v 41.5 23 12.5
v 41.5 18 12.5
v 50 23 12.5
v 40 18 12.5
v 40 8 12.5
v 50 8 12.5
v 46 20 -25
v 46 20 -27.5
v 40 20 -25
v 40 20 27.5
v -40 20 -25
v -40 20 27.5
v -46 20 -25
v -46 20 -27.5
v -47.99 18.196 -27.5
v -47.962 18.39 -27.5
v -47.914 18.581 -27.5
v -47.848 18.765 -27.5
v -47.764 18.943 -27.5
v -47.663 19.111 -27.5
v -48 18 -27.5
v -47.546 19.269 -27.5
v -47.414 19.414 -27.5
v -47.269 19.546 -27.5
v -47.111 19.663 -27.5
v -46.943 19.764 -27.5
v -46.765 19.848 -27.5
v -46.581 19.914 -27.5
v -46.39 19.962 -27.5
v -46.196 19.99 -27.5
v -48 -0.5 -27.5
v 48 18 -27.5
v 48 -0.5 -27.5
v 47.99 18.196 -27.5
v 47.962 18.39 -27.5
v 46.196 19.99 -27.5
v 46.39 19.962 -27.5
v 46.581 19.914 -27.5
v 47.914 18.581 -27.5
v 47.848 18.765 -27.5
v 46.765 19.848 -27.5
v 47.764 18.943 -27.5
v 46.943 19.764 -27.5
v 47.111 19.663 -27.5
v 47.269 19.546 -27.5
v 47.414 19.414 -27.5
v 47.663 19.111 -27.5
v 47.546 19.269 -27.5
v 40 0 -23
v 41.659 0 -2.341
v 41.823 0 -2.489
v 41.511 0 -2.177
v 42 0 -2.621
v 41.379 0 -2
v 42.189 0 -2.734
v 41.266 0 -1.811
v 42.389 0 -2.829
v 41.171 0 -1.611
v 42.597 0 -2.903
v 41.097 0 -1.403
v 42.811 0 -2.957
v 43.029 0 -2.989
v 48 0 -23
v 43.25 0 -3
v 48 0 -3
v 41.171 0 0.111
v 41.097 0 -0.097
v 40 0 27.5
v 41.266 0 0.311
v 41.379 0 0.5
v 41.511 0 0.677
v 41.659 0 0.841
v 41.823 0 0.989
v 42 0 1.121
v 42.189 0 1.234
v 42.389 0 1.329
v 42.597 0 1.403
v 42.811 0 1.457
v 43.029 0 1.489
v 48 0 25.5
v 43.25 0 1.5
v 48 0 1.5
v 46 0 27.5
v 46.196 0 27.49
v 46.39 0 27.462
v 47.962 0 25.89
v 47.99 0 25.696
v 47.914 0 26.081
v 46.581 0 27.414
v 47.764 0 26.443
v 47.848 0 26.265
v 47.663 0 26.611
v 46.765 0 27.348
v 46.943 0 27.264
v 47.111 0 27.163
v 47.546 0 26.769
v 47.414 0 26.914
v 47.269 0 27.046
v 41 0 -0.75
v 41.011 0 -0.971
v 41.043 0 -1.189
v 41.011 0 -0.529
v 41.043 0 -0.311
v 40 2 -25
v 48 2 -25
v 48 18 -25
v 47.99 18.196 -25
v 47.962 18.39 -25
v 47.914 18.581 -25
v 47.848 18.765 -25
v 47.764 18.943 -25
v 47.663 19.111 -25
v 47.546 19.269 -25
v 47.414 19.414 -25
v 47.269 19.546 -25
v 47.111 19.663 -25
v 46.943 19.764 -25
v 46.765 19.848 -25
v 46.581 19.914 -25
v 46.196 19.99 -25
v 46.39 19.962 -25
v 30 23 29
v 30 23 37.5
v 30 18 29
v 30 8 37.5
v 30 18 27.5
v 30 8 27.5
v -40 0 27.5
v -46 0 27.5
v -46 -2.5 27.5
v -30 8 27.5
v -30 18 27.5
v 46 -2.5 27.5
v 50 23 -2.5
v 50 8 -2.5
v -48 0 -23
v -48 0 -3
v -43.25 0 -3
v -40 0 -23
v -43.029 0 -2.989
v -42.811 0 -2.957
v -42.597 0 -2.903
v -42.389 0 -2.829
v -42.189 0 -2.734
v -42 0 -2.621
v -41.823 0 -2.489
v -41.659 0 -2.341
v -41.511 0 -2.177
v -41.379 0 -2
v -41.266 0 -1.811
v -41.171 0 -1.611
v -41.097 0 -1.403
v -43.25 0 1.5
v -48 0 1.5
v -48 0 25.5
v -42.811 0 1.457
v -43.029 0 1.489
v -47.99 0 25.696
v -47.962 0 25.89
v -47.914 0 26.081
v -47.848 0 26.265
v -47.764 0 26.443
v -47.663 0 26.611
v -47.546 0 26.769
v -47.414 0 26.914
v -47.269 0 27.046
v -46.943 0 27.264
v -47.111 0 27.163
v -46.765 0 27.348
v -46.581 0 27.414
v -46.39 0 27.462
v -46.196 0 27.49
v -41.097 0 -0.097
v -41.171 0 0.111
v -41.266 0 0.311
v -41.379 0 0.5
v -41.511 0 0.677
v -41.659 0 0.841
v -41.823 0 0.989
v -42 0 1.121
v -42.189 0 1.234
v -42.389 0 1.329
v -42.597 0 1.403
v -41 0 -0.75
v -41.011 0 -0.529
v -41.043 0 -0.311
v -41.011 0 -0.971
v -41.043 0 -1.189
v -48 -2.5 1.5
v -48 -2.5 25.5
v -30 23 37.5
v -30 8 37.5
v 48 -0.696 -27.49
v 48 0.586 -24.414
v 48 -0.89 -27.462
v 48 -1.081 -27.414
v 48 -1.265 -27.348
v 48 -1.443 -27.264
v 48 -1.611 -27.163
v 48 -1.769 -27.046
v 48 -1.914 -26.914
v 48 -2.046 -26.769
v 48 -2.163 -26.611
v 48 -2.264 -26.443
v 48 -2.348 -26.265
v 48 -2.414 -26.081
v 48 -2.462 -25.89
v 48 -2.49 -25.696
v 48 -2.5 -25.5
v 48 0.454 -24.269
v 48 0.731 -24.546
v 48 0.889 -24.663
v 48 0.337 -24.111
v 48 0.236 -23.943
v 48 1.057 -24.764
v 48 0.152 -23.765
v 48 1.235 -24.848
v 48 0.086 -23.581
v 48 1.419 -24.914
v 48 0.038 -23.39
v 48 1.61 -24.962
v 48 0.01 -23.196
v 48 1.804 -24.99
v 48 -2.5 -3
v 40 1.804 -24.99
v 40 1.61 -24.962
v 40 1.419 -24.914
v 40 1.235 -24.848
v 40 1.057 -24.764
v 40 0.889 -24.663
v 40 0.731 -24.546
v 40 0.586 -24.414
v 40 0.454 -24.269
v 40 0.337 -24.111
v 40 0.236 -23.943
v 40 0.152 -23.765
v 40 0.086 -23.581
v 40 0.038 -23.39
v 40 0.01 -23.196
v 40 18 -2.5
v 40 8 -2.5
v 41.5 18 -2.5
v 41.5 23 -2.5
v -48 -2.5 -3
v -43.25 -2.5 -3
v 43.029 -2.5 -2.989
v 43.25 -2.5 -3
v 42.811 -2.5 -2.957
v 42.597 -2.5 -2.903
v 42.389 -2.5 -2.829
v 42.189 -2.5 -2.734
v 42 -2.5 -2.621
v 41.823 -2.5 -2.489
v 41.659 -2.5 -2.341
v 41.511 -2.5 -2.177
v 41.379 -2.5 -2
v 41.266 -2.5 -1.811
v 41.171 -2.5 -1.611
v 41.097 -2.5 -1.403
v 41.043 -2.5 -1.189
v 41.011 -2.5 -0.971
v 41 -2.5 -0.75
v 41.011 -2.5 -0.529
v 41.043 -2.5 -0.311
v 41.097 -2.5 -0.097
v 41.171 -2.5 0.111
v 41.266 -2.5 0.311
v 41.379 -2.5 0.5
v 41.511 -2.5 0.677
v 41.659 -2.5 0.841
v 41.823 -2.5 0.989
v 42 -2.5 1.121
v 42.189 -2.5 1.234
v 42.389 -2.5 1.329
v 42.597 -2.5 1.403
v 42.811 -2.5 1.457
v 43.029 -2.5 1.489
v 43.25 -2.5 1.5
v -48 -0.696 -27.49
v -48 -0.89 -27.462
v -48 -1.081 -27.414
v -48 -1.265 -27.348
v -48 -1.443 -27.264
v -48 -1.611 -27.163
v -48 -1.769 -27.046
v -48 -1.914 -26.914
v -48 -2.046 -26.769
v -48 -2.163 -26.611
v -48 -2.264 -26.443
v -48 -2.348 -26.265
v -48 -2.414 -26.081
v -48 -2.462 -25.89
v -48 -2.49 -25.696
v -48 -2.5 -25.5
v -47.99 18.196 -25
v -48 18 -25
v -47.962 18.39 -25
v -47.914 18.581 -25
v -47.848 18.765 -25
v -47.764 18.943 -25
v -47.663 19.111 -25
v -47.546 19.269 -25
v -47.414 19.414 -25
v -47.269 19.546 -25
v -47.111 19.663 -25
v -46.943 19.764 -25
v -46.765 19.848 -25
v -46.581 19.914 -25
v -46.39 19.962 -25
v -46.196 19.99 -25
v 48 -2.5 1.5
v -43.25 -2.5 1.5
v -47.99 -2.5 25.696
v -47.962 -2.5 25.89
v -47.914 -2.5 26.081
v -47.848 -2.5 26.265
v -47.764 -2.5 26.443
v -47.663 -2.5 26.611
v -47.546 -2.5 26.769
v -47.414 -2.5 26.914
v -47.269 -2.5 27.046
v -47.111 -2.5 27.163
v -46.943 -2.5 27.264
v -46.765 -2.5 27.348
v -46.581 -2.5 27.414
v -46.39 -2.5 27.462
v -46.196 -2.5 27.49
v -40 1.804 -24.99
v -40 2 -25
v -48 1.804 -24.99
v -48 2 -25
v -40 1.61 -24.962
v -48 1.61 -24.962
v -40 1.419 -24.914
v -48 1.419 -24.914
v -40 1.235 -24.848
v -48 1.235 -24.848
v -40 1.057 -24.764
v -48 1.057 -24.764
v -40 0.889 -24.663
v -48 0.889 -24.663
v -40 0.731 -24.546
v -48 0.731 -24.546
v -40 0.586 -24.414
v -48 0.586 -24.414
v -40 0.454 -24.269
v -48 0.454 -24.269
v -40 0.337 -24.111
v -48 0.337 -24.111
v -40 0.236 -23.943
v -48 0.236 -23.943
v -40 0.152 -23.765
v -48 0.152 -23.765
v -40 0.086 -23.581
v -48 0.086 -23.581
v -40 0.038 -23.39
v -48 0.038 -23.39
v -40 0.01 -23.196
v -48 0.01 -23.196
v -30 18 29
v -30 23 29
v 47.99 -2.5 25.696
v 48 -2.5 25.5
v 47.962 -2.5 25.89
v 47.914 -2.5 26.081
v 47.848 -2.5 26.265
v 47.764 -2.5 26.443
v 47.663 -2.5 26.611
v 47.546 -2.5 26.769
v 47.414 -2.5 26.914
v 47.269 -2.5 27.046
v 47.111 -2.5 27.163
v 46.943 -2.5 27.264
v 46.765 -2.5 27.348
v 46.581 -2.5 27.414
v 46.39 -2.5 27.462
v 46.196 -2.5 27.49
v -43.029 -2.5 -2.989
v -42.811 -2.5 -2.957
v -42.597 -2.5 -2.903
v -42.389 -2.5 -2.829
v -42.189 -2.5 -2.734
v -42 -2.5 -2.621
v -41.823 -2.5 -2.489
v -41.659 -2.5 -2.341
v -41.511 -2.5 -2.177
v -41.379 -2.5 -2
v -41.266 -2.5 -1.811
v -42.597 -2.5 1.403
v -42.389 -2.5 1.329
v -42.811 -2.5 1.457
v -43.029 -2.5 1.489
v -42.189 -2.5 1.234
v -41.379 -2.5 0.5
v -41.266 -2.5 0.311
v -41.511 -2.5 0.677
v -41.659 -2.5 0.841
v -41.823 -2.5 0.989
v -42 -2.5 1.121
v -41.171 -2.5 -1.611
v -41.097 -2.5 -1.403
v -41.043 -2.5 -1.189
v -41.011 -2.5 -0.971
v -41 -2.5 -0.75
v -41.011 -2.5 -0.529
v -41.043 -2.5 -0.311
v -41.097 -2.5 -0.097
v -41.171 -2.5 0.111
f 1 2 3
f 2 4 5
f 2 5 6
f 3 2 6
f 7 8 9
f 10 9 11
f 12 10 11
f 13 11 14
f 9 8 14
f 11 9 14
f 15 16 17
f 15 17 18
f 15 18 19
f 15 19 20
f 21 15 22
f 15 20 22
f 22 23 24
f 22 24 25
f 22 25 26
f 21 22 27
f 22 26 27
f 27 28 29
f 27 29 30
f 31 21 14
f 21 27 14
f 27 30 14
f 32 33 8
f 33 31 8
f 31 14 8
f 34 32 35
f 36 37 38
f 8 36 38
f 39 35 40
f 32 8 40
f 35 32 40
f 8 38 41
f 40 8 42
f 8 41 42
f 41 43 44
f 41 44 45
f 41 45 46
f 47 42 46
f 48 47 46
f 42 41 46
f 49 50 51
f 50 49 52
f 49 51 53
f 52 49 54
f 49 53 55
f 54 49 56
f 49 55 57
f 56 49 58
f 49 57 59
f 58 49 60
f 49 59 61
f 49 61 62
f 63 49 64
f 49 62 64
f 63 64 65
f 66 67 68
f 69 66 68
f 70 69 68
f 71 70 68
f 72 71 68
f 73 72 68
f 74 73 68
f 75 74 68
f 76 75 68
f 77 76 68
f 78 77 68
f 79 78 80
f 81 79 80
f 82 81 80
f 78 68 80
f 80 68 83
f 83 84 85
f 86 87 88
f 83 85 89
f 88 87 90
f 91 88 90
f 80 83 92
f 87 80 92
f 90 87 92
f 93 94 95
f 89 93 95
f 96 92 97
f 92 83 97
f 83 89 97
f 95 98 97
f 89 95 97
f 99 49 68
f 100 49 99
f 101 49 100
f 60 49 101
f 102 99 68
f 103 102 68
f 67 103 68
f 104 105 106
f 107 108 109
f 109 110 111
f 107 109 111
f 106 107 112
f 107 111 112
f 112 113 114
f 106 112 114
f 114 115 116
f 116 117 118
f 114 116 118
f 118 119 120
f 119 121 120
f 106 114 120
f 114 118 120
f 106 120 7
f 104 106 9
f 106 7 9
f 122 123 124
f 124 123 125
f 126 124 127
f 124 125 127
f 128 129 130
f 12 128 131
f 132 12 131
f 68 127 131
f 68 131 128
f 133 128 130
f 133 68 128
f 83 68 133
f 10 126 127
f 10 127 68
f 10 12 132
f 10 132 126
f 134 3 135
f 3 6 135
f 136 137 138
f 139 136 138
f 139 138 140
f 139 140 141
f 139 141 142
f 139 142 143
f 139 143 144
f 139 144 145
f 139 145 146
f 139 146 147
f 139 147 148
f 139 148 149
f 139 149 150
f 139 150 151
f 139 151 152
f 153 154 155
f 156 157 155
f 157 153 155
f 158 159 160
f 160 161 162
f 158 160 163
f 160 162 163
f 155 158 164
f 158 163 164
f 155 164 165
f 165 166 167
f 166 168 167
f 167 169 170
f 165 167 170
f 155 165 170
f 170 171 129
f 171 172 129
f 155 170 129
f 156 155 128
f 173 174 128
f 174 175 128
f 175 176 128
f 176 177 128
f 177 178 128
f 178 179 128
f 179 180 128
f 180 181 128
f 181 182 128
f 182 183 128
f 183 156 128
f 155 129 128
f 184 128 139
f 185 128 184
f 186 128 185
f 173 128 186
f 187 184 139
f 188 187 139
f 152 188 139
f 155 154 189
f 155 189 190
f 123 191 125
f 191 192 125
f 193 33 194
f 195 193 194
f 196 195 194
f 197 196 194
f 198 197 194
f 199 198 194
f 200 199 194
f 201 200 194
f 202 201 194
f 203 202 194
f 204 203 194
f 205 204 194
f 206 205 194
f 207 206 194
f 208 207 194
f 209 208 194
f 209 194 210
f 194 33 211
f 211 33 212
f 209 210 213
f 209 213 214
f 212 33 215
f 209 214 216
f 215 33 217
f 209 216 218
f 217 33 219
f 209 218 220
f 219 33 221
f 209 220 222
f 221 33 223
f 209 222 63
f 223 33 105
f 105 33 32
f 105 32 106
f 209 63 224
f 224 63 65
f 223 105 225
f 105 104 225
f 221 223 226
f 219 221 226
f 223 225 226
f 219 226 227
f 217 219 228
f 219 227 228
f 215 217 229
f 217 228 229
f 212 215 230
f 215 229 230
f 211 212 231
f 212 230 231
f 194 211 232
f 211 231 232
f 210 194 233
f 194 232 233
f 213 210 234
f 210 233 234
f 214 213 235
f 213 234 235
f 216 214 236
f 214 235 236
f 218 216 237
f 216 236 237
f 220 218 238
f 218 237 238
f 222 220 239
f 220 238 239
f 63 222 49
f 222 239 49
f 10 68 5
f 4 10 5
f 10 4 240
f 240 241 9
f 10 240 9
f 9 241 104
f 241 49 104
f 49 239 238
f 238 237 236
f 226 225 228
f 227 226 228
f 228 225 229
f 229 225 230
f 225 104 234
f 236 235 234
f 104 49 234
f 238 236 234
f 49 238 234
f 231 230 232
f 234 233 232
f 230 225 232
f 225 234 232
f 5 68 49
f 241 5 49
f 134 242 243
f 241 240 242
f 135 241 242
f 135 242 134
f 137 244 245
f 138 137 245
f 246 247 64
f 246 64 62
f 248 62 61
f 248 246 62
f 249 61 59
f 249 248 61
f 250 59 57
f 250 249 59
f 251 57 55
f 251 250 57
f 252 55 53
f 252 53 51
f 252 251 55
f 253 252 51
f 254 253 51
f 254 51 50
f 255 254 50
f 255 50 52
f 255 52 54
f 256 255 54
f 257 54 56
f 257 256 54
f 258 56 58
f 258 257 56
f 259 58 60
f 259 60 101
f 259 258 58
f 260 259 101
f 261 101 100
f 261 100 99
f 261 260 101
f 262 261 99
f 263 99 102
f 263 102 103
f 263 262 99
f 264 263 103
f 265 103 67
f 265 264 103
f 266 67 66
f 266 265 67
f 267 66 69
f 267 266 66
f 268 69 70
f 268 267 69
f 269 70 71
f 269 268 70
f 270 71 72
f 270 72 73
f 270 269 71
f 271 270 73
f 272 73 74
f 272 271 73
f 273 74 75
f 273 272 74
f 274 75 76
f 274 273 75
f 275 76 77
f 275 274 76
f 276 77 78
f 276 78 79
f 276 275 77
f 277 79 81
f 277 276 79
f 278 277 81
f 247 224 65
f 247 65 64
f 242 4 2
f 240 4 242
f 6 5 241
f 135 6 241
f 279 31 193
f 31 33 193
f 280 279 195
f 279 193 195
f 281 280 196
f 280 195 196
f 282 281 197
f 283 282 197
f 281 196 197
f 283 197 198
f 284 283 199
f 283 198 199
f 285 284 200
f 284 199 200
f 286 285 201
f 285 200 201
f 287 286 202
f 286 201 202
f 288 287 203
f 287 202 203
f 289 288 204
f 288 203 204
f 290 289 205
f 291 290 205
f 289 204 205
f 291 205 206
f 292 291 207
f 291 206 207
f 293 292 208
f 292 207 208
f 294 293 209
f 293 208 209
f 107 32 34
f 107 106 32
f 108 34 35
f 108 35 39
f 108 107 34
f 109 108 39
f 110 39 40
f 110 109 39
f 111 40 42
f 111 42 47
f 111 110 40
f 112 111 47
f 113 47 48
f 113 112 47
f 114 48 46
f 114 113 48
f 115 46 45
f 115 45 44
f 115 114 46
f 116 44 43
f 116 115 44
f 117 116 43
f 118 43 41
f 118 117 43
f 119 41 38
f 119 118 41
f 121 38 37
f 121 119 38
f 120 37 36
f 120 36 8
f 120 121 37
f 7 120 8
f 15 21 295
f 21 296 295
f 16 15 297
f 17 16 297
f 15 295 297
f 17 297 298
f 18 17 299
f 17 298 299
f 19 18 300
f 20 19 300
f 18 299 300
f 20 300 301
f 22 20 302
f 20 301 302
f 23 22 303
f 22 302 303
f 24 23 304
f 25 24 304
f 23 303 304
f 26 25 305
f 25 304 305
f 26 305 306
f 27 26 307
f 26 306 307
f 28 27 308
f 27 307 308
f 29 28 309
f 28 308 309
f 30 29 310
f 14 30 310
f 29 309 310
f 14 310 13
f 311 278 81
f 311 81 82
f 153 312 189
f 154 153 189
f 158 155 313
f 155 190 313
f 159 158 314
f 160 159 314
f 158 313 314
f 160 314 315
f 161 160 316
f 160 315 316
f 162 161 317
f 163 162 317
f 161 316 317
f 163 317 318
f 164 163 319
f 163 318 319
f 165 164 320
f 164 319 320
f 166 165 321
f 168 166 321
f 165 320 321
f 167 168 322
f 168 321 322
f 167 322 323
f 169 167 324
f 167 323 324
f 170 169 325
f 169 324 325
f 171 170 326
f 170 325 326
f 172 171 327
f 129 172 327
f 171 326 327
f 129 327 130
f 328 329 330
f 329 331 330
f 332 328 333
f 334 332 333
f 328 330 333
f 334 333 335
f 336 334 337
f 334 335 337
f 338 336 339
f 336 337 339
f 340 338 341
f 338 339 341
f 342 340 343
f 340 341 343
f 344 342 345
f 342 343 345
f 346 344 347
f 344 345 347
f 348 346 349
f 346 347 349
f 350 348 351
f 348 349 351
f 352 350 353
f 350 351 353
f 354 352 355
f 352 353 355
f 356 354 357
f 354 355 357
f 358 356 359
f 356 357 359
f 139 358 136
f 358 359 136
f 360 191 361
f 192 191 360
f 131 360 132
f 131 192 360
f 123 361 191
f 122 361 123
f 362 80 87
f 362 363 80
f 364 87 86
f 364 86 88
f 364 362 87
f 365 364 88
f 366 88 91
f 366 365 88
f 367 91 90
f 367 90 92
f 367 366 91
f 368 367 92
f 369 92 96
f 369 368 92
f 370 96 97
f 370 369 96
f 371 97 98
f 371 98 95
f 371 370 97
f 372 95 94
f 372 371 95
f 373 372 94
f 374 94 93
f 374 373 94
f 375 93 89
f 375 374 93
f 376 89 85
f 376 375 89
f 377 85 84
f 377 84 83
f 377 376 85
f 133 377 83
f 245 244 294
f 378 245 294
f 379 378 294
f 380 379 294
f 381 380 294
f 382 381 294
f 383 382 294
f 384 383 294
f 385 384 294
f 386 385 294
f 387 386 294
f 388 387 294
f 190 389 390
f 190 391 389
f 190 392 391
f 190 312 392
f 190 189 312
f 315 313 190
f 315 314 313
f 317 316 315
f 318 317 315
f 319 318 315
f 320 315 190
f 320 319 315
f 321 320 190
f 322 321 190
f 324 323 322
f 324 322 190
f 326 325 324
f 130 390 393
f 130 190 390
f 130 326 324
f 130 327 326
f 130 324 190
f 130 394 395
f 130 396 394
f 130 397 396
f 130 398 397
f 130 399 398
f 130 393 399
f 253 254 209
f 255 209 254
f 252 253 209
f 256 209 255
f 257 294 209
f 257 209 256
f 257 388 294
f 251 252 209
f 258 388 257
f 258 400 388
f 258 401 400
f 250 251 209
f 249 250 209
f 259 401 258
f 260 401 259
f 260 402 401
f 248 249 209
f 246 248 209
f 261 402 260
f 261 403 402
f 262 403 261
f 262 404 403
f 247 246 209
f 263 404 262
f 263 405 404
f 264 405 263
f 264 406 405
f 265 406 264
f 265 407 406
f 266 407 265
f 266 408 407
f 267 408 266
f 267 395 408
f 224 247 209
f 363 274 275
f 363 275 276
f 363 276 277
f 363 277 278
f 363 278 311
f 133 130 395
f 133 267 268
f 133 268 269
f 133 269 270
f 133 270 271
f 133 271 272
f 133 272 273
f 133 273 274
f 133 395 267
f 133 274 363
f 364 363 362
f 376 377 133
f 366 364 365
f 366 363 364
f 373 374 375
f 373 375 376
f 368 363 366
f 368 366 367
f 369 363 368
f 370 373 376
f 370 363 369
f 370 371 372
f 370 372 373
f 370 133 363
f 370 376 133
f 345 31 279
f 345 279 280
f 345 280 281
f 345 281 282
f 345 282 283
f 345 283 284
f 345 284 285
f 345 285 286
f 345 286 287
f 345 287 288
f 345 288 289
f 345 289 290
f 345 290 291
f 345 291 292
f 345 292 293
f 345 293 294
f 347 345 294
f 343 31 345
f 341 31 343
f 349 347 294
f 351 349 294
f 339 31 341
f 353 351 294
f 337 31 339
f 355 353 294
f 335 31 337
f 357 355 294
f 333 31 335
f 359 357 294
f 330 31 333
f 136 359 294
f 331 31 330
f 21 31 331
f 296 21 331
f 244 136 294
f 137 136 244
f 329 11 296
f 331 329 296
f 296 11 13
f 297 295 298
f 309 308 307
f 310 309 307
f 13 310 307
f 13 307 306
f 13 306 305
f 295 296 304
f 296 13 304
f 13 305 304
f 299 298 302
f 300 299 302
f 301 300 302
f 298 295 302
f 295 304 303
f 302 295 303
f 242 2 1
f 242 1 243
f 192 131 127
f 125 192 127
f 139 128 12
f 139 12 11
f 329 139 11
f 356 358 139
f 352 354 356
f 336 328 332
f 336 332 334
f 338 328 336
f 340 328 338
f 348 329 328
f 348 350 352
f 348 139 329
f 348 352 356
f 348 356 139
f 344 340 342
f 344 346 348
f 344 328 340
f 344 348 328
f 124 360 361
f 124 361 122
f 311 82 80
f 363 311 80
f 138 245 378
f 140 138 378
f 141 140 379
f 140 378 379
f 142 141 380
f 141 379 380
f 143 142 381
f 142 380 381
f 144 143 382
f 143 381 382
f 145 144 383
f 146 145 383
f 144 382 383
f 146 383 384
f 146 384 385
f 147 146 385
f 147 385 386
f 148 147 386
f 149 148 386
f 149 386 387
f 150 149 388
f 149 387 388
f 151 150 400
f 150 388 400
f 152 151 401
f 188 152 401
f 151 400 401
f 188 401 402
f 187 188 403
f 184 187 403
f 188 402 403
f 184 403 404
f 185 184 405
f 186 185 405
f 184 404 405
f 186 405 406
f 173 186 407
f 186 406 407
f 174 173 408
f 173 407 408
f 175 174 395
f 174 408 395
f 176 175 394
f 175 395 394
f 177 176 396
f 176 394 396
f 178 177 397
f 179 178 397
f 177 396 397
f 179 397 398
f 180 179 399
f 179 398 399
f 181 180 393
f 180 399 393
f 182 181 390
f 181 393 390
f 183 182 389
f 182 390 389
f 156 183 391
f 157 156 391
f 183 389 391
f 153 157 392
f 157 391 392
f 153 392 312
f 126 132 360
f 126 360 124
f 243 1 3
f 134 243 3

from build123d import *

# Parameters (mm, degrees)
SKETCH_1_W          = 80
SKETCH_1_H          = 55
EXTRUDE_1_DEPTH     = 20
SKETCH_2_W          = 15
SKETCH_2_H          = 10
EXTRUDE_2_DEPTH     = 10
SKETCH_3_W          = 8.5
SKETCH_3_H          = 15
EXTRUDE_3_DEPTH     = 5
SKETCH_4_W          = 60
SKETCH_4_H          = 10
EXTRUDE_4_DEPTH     = 10
SKETCH_5_W          = 60
SKETCH_5_H          = 8.5
EXTRUDE_5_DEPTH     = 5
SKETCH_6_W          = 96
SKETCH_6_H          = 20
EXTRUDE_6_DEPTH     = 2.5
SKETCH_7_W          = 96
SKETCH_7_H          = 55
EXTRUDE_8_DEPTH     = 2.5
FILLET_1_R          = 2
CUT_EXTRUDE_1_DEPTH = 2.5


with BuildPart() as part:
    # 草图1 → 凸台-拉伸1 (new body)
    with BuildSketch(Plane(origin=(0, 0, 0), x_dir=(1, 0, 0), z_dir=(0, 1, 0))):
        Rectangle(SKETCH_1_W, SKETCH_1_H)
    extrude(amount=EXTRUDE_1_DEPTH)

    # 草图2 → 凸台-拉伸2 (add)
    with BuildSketch(Plane(origin=(40, 0, 0), x_dir=(0, 0, -1), z_dir=(1, 0, 0))):
        with Locations((-5, 13)):
            Rectangle(SKETCH_2_W, SKETCH_2_H)
    extrude(amount=EXTRUDE_2_DEPTH)

    # 草图3 → 凸台-拉伸3 (add)
    with BuildSketch(Plane(origin=(0, 18, 0), x_dir=(1, 0, 0), z_dir=(0, 1, 0))):
        with Locations((45.75, -5)):
            Rectangle(SKETCH_3_W, SKETCH_3_H)
    extrude(amount=EXTRUDE_3_DEPTH)

    # 草图4 → 凸台-拉伸4 (add)
    with BuildSketch(Plane.XY.offset(27.5)):
        with Locations((0, 13)):
            Rectangle(SKETCH_4_W, SKETCH_4_H)
    extrude(amount=EXTRUDE_4_DEPTH)

    # 草图5 → 凸台-拉伸5 (add)
    with BuildSketch(Plane(origin=(0, 18, 0), x_dir=(1, 0, 0), z_dir=(0, 1, 0))):
        with Locations((0, -33.25)):
            Rectangle(SKETCH_5_W, SKETCH_5_H)
    extrude(amount=EXTRUDE_5_DEPTH)

    # 草图6 → 凸台-拉伸6 (add)
    with BuildSketch(Plane(origin=(0, 0, -27.5), x_dir=(-1, 0, 0), z_dir=(0, 0, -1))):
        with Locations((0, 10)):
            Rectangle(SKETCH_6_W, SKETCH_6_H)
    extrude(amount=-EXTRUDE_6_DEPTH)

    # 草图7 → 凸台-拉伸8 (add)
    with BuildSketch(Plane.XZ):
        Rectangle(SKETCH_7_W, SKETCH_7_H)
    extrude(amount=EXTRUDE_8_DEPTH)

    # 圆角1
    fillet_1_edges = [part.edges().sort_by_distance(p)[0] for p in [
        (48, 20, -26.25),
        (44, 0, -25),
        (-44, 0, -25),
        (-48, 20, -26.25),
        (-48, -1.25, 27.5),
        (48, -1.25, 27.5),
        (0, -2.5, -27.5),
    ]]
    fillet(fillet_1_edges, radius=FILLET_1_R)

    # 草图8 → 切除-拉伸1 (cut)
    with BuildSketch(Plane.XZ.offset(2.5)):
        with BuildLine():
            Line((-48, -3), (-43.25, -3))
            ThreePointArc((-43.25, -3), (-41, -0.75), (-43.25, 1.5))
            Line((-43.25, 1.5), (-48, 1.5))
            Line((-48, 1.5), (-48, -3))
        make_face()
        with BuildLine():
            Line((48, 1.5), (48, -3))
            Line((48, -3), (43.25, -3))
            ThreePointArc((43.25, -3), (41, -0.75), (43.25, 1.5))
            Line((43.25, 1.5), (48, 1.5))
        make_face()
    extrude(amount=-CUT_EXTRUDE_1_DEPTH, mode=Mode.SUBTRACT)


solid = part.part
